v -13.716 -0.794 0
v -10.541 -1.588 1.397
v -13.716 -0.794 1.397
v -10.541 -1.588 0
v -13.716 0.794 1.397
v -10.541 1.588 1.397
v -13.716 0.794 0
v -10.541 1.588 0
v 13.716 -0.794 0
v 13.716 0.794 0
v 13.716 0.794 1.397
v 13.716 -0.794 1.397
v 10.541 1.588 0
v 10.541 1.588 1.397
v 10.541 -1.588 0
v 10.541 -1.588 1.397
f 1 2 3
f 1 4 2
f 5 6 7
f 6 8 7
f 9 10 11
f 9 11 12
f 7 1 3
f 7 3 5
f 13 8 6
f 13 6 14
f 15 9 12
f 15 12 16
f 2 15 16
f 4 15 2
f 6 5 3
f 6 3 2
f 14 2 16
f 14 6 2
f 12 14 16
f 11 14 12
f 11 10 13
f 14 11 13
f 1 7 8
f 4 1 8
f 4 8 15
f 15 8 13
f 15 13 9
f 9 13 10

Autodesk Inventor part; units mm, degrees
ref_plane "YZ Plane" through (0, 0, 0) normal (1, 0, 0) x (0, 1, 0)
ref_plane "XZ Plane" through (0, 0, 0) normal (0, 1, 0) x (-1, 0, 0)
ref_plane "XY Plane" through (0, 0, 0) normal (0, 0, 1) x (1, 0, 0)
sketch "Sketch1" plane through (0, 0, 0) normal (0, 0, 1) x (1, 0, 0)
  line L0 (-10.541, 1.5875) -> (10.541, 1.5875)
  line L1 (13.716, 0.7938) -> (13.716, -0.7937)
  line L2 (10.541, -1.5875) -> (-10.541, -1.5875)
  line L3 (-13.716, -0.7937) -> (-13.716, 0.7938)
  line L4 (-19.2024, 0) -> (19.2024, 0) projected
  line L5 (0, -2.2225) -> (0, 2.2225) projected
  line L6 (-10.541, 1.5875) -> (-13.716, 0.7938)
  line L7 (-10.541, -1.5875) -> (-13.716, -0.7937)
  line L8 (13.716, -0.7937) -> (10.541, -1.5875)
  line L9 (13.716, 0.7938) -> (10.541, 1.5875)
  line L10 (-0.635, 0) -> (-0.635, 0)
  line L11 (-8.255, 0) -> (-8.255, 0)
  line L12 (8.255, 0) -> (8.255, 0)
  line L13 (0.635, 0) -> (0.635, 0)
  dimension "d0" = 27.432
  dimension "d1" = 3.175
  dimension "d2" = 13.716
  dimension "d3" = 1.5875
  dimension "d5" = 3.175
  dimension "d6" = 1.5875
  dimension "d7" = 0.7937
  dimension "d8" = 1.5875
  dimension "d9" = 0.7937
  dimension "d10" = 3.175
  dimension "d11" = 3.175
extrude "Extrusion2" add sketch "Sketch1" along normal blind 1.397
equation "\"d9\" = 0.5 * d8"
properties part number "Head Bar Solid" material "Titanium"
